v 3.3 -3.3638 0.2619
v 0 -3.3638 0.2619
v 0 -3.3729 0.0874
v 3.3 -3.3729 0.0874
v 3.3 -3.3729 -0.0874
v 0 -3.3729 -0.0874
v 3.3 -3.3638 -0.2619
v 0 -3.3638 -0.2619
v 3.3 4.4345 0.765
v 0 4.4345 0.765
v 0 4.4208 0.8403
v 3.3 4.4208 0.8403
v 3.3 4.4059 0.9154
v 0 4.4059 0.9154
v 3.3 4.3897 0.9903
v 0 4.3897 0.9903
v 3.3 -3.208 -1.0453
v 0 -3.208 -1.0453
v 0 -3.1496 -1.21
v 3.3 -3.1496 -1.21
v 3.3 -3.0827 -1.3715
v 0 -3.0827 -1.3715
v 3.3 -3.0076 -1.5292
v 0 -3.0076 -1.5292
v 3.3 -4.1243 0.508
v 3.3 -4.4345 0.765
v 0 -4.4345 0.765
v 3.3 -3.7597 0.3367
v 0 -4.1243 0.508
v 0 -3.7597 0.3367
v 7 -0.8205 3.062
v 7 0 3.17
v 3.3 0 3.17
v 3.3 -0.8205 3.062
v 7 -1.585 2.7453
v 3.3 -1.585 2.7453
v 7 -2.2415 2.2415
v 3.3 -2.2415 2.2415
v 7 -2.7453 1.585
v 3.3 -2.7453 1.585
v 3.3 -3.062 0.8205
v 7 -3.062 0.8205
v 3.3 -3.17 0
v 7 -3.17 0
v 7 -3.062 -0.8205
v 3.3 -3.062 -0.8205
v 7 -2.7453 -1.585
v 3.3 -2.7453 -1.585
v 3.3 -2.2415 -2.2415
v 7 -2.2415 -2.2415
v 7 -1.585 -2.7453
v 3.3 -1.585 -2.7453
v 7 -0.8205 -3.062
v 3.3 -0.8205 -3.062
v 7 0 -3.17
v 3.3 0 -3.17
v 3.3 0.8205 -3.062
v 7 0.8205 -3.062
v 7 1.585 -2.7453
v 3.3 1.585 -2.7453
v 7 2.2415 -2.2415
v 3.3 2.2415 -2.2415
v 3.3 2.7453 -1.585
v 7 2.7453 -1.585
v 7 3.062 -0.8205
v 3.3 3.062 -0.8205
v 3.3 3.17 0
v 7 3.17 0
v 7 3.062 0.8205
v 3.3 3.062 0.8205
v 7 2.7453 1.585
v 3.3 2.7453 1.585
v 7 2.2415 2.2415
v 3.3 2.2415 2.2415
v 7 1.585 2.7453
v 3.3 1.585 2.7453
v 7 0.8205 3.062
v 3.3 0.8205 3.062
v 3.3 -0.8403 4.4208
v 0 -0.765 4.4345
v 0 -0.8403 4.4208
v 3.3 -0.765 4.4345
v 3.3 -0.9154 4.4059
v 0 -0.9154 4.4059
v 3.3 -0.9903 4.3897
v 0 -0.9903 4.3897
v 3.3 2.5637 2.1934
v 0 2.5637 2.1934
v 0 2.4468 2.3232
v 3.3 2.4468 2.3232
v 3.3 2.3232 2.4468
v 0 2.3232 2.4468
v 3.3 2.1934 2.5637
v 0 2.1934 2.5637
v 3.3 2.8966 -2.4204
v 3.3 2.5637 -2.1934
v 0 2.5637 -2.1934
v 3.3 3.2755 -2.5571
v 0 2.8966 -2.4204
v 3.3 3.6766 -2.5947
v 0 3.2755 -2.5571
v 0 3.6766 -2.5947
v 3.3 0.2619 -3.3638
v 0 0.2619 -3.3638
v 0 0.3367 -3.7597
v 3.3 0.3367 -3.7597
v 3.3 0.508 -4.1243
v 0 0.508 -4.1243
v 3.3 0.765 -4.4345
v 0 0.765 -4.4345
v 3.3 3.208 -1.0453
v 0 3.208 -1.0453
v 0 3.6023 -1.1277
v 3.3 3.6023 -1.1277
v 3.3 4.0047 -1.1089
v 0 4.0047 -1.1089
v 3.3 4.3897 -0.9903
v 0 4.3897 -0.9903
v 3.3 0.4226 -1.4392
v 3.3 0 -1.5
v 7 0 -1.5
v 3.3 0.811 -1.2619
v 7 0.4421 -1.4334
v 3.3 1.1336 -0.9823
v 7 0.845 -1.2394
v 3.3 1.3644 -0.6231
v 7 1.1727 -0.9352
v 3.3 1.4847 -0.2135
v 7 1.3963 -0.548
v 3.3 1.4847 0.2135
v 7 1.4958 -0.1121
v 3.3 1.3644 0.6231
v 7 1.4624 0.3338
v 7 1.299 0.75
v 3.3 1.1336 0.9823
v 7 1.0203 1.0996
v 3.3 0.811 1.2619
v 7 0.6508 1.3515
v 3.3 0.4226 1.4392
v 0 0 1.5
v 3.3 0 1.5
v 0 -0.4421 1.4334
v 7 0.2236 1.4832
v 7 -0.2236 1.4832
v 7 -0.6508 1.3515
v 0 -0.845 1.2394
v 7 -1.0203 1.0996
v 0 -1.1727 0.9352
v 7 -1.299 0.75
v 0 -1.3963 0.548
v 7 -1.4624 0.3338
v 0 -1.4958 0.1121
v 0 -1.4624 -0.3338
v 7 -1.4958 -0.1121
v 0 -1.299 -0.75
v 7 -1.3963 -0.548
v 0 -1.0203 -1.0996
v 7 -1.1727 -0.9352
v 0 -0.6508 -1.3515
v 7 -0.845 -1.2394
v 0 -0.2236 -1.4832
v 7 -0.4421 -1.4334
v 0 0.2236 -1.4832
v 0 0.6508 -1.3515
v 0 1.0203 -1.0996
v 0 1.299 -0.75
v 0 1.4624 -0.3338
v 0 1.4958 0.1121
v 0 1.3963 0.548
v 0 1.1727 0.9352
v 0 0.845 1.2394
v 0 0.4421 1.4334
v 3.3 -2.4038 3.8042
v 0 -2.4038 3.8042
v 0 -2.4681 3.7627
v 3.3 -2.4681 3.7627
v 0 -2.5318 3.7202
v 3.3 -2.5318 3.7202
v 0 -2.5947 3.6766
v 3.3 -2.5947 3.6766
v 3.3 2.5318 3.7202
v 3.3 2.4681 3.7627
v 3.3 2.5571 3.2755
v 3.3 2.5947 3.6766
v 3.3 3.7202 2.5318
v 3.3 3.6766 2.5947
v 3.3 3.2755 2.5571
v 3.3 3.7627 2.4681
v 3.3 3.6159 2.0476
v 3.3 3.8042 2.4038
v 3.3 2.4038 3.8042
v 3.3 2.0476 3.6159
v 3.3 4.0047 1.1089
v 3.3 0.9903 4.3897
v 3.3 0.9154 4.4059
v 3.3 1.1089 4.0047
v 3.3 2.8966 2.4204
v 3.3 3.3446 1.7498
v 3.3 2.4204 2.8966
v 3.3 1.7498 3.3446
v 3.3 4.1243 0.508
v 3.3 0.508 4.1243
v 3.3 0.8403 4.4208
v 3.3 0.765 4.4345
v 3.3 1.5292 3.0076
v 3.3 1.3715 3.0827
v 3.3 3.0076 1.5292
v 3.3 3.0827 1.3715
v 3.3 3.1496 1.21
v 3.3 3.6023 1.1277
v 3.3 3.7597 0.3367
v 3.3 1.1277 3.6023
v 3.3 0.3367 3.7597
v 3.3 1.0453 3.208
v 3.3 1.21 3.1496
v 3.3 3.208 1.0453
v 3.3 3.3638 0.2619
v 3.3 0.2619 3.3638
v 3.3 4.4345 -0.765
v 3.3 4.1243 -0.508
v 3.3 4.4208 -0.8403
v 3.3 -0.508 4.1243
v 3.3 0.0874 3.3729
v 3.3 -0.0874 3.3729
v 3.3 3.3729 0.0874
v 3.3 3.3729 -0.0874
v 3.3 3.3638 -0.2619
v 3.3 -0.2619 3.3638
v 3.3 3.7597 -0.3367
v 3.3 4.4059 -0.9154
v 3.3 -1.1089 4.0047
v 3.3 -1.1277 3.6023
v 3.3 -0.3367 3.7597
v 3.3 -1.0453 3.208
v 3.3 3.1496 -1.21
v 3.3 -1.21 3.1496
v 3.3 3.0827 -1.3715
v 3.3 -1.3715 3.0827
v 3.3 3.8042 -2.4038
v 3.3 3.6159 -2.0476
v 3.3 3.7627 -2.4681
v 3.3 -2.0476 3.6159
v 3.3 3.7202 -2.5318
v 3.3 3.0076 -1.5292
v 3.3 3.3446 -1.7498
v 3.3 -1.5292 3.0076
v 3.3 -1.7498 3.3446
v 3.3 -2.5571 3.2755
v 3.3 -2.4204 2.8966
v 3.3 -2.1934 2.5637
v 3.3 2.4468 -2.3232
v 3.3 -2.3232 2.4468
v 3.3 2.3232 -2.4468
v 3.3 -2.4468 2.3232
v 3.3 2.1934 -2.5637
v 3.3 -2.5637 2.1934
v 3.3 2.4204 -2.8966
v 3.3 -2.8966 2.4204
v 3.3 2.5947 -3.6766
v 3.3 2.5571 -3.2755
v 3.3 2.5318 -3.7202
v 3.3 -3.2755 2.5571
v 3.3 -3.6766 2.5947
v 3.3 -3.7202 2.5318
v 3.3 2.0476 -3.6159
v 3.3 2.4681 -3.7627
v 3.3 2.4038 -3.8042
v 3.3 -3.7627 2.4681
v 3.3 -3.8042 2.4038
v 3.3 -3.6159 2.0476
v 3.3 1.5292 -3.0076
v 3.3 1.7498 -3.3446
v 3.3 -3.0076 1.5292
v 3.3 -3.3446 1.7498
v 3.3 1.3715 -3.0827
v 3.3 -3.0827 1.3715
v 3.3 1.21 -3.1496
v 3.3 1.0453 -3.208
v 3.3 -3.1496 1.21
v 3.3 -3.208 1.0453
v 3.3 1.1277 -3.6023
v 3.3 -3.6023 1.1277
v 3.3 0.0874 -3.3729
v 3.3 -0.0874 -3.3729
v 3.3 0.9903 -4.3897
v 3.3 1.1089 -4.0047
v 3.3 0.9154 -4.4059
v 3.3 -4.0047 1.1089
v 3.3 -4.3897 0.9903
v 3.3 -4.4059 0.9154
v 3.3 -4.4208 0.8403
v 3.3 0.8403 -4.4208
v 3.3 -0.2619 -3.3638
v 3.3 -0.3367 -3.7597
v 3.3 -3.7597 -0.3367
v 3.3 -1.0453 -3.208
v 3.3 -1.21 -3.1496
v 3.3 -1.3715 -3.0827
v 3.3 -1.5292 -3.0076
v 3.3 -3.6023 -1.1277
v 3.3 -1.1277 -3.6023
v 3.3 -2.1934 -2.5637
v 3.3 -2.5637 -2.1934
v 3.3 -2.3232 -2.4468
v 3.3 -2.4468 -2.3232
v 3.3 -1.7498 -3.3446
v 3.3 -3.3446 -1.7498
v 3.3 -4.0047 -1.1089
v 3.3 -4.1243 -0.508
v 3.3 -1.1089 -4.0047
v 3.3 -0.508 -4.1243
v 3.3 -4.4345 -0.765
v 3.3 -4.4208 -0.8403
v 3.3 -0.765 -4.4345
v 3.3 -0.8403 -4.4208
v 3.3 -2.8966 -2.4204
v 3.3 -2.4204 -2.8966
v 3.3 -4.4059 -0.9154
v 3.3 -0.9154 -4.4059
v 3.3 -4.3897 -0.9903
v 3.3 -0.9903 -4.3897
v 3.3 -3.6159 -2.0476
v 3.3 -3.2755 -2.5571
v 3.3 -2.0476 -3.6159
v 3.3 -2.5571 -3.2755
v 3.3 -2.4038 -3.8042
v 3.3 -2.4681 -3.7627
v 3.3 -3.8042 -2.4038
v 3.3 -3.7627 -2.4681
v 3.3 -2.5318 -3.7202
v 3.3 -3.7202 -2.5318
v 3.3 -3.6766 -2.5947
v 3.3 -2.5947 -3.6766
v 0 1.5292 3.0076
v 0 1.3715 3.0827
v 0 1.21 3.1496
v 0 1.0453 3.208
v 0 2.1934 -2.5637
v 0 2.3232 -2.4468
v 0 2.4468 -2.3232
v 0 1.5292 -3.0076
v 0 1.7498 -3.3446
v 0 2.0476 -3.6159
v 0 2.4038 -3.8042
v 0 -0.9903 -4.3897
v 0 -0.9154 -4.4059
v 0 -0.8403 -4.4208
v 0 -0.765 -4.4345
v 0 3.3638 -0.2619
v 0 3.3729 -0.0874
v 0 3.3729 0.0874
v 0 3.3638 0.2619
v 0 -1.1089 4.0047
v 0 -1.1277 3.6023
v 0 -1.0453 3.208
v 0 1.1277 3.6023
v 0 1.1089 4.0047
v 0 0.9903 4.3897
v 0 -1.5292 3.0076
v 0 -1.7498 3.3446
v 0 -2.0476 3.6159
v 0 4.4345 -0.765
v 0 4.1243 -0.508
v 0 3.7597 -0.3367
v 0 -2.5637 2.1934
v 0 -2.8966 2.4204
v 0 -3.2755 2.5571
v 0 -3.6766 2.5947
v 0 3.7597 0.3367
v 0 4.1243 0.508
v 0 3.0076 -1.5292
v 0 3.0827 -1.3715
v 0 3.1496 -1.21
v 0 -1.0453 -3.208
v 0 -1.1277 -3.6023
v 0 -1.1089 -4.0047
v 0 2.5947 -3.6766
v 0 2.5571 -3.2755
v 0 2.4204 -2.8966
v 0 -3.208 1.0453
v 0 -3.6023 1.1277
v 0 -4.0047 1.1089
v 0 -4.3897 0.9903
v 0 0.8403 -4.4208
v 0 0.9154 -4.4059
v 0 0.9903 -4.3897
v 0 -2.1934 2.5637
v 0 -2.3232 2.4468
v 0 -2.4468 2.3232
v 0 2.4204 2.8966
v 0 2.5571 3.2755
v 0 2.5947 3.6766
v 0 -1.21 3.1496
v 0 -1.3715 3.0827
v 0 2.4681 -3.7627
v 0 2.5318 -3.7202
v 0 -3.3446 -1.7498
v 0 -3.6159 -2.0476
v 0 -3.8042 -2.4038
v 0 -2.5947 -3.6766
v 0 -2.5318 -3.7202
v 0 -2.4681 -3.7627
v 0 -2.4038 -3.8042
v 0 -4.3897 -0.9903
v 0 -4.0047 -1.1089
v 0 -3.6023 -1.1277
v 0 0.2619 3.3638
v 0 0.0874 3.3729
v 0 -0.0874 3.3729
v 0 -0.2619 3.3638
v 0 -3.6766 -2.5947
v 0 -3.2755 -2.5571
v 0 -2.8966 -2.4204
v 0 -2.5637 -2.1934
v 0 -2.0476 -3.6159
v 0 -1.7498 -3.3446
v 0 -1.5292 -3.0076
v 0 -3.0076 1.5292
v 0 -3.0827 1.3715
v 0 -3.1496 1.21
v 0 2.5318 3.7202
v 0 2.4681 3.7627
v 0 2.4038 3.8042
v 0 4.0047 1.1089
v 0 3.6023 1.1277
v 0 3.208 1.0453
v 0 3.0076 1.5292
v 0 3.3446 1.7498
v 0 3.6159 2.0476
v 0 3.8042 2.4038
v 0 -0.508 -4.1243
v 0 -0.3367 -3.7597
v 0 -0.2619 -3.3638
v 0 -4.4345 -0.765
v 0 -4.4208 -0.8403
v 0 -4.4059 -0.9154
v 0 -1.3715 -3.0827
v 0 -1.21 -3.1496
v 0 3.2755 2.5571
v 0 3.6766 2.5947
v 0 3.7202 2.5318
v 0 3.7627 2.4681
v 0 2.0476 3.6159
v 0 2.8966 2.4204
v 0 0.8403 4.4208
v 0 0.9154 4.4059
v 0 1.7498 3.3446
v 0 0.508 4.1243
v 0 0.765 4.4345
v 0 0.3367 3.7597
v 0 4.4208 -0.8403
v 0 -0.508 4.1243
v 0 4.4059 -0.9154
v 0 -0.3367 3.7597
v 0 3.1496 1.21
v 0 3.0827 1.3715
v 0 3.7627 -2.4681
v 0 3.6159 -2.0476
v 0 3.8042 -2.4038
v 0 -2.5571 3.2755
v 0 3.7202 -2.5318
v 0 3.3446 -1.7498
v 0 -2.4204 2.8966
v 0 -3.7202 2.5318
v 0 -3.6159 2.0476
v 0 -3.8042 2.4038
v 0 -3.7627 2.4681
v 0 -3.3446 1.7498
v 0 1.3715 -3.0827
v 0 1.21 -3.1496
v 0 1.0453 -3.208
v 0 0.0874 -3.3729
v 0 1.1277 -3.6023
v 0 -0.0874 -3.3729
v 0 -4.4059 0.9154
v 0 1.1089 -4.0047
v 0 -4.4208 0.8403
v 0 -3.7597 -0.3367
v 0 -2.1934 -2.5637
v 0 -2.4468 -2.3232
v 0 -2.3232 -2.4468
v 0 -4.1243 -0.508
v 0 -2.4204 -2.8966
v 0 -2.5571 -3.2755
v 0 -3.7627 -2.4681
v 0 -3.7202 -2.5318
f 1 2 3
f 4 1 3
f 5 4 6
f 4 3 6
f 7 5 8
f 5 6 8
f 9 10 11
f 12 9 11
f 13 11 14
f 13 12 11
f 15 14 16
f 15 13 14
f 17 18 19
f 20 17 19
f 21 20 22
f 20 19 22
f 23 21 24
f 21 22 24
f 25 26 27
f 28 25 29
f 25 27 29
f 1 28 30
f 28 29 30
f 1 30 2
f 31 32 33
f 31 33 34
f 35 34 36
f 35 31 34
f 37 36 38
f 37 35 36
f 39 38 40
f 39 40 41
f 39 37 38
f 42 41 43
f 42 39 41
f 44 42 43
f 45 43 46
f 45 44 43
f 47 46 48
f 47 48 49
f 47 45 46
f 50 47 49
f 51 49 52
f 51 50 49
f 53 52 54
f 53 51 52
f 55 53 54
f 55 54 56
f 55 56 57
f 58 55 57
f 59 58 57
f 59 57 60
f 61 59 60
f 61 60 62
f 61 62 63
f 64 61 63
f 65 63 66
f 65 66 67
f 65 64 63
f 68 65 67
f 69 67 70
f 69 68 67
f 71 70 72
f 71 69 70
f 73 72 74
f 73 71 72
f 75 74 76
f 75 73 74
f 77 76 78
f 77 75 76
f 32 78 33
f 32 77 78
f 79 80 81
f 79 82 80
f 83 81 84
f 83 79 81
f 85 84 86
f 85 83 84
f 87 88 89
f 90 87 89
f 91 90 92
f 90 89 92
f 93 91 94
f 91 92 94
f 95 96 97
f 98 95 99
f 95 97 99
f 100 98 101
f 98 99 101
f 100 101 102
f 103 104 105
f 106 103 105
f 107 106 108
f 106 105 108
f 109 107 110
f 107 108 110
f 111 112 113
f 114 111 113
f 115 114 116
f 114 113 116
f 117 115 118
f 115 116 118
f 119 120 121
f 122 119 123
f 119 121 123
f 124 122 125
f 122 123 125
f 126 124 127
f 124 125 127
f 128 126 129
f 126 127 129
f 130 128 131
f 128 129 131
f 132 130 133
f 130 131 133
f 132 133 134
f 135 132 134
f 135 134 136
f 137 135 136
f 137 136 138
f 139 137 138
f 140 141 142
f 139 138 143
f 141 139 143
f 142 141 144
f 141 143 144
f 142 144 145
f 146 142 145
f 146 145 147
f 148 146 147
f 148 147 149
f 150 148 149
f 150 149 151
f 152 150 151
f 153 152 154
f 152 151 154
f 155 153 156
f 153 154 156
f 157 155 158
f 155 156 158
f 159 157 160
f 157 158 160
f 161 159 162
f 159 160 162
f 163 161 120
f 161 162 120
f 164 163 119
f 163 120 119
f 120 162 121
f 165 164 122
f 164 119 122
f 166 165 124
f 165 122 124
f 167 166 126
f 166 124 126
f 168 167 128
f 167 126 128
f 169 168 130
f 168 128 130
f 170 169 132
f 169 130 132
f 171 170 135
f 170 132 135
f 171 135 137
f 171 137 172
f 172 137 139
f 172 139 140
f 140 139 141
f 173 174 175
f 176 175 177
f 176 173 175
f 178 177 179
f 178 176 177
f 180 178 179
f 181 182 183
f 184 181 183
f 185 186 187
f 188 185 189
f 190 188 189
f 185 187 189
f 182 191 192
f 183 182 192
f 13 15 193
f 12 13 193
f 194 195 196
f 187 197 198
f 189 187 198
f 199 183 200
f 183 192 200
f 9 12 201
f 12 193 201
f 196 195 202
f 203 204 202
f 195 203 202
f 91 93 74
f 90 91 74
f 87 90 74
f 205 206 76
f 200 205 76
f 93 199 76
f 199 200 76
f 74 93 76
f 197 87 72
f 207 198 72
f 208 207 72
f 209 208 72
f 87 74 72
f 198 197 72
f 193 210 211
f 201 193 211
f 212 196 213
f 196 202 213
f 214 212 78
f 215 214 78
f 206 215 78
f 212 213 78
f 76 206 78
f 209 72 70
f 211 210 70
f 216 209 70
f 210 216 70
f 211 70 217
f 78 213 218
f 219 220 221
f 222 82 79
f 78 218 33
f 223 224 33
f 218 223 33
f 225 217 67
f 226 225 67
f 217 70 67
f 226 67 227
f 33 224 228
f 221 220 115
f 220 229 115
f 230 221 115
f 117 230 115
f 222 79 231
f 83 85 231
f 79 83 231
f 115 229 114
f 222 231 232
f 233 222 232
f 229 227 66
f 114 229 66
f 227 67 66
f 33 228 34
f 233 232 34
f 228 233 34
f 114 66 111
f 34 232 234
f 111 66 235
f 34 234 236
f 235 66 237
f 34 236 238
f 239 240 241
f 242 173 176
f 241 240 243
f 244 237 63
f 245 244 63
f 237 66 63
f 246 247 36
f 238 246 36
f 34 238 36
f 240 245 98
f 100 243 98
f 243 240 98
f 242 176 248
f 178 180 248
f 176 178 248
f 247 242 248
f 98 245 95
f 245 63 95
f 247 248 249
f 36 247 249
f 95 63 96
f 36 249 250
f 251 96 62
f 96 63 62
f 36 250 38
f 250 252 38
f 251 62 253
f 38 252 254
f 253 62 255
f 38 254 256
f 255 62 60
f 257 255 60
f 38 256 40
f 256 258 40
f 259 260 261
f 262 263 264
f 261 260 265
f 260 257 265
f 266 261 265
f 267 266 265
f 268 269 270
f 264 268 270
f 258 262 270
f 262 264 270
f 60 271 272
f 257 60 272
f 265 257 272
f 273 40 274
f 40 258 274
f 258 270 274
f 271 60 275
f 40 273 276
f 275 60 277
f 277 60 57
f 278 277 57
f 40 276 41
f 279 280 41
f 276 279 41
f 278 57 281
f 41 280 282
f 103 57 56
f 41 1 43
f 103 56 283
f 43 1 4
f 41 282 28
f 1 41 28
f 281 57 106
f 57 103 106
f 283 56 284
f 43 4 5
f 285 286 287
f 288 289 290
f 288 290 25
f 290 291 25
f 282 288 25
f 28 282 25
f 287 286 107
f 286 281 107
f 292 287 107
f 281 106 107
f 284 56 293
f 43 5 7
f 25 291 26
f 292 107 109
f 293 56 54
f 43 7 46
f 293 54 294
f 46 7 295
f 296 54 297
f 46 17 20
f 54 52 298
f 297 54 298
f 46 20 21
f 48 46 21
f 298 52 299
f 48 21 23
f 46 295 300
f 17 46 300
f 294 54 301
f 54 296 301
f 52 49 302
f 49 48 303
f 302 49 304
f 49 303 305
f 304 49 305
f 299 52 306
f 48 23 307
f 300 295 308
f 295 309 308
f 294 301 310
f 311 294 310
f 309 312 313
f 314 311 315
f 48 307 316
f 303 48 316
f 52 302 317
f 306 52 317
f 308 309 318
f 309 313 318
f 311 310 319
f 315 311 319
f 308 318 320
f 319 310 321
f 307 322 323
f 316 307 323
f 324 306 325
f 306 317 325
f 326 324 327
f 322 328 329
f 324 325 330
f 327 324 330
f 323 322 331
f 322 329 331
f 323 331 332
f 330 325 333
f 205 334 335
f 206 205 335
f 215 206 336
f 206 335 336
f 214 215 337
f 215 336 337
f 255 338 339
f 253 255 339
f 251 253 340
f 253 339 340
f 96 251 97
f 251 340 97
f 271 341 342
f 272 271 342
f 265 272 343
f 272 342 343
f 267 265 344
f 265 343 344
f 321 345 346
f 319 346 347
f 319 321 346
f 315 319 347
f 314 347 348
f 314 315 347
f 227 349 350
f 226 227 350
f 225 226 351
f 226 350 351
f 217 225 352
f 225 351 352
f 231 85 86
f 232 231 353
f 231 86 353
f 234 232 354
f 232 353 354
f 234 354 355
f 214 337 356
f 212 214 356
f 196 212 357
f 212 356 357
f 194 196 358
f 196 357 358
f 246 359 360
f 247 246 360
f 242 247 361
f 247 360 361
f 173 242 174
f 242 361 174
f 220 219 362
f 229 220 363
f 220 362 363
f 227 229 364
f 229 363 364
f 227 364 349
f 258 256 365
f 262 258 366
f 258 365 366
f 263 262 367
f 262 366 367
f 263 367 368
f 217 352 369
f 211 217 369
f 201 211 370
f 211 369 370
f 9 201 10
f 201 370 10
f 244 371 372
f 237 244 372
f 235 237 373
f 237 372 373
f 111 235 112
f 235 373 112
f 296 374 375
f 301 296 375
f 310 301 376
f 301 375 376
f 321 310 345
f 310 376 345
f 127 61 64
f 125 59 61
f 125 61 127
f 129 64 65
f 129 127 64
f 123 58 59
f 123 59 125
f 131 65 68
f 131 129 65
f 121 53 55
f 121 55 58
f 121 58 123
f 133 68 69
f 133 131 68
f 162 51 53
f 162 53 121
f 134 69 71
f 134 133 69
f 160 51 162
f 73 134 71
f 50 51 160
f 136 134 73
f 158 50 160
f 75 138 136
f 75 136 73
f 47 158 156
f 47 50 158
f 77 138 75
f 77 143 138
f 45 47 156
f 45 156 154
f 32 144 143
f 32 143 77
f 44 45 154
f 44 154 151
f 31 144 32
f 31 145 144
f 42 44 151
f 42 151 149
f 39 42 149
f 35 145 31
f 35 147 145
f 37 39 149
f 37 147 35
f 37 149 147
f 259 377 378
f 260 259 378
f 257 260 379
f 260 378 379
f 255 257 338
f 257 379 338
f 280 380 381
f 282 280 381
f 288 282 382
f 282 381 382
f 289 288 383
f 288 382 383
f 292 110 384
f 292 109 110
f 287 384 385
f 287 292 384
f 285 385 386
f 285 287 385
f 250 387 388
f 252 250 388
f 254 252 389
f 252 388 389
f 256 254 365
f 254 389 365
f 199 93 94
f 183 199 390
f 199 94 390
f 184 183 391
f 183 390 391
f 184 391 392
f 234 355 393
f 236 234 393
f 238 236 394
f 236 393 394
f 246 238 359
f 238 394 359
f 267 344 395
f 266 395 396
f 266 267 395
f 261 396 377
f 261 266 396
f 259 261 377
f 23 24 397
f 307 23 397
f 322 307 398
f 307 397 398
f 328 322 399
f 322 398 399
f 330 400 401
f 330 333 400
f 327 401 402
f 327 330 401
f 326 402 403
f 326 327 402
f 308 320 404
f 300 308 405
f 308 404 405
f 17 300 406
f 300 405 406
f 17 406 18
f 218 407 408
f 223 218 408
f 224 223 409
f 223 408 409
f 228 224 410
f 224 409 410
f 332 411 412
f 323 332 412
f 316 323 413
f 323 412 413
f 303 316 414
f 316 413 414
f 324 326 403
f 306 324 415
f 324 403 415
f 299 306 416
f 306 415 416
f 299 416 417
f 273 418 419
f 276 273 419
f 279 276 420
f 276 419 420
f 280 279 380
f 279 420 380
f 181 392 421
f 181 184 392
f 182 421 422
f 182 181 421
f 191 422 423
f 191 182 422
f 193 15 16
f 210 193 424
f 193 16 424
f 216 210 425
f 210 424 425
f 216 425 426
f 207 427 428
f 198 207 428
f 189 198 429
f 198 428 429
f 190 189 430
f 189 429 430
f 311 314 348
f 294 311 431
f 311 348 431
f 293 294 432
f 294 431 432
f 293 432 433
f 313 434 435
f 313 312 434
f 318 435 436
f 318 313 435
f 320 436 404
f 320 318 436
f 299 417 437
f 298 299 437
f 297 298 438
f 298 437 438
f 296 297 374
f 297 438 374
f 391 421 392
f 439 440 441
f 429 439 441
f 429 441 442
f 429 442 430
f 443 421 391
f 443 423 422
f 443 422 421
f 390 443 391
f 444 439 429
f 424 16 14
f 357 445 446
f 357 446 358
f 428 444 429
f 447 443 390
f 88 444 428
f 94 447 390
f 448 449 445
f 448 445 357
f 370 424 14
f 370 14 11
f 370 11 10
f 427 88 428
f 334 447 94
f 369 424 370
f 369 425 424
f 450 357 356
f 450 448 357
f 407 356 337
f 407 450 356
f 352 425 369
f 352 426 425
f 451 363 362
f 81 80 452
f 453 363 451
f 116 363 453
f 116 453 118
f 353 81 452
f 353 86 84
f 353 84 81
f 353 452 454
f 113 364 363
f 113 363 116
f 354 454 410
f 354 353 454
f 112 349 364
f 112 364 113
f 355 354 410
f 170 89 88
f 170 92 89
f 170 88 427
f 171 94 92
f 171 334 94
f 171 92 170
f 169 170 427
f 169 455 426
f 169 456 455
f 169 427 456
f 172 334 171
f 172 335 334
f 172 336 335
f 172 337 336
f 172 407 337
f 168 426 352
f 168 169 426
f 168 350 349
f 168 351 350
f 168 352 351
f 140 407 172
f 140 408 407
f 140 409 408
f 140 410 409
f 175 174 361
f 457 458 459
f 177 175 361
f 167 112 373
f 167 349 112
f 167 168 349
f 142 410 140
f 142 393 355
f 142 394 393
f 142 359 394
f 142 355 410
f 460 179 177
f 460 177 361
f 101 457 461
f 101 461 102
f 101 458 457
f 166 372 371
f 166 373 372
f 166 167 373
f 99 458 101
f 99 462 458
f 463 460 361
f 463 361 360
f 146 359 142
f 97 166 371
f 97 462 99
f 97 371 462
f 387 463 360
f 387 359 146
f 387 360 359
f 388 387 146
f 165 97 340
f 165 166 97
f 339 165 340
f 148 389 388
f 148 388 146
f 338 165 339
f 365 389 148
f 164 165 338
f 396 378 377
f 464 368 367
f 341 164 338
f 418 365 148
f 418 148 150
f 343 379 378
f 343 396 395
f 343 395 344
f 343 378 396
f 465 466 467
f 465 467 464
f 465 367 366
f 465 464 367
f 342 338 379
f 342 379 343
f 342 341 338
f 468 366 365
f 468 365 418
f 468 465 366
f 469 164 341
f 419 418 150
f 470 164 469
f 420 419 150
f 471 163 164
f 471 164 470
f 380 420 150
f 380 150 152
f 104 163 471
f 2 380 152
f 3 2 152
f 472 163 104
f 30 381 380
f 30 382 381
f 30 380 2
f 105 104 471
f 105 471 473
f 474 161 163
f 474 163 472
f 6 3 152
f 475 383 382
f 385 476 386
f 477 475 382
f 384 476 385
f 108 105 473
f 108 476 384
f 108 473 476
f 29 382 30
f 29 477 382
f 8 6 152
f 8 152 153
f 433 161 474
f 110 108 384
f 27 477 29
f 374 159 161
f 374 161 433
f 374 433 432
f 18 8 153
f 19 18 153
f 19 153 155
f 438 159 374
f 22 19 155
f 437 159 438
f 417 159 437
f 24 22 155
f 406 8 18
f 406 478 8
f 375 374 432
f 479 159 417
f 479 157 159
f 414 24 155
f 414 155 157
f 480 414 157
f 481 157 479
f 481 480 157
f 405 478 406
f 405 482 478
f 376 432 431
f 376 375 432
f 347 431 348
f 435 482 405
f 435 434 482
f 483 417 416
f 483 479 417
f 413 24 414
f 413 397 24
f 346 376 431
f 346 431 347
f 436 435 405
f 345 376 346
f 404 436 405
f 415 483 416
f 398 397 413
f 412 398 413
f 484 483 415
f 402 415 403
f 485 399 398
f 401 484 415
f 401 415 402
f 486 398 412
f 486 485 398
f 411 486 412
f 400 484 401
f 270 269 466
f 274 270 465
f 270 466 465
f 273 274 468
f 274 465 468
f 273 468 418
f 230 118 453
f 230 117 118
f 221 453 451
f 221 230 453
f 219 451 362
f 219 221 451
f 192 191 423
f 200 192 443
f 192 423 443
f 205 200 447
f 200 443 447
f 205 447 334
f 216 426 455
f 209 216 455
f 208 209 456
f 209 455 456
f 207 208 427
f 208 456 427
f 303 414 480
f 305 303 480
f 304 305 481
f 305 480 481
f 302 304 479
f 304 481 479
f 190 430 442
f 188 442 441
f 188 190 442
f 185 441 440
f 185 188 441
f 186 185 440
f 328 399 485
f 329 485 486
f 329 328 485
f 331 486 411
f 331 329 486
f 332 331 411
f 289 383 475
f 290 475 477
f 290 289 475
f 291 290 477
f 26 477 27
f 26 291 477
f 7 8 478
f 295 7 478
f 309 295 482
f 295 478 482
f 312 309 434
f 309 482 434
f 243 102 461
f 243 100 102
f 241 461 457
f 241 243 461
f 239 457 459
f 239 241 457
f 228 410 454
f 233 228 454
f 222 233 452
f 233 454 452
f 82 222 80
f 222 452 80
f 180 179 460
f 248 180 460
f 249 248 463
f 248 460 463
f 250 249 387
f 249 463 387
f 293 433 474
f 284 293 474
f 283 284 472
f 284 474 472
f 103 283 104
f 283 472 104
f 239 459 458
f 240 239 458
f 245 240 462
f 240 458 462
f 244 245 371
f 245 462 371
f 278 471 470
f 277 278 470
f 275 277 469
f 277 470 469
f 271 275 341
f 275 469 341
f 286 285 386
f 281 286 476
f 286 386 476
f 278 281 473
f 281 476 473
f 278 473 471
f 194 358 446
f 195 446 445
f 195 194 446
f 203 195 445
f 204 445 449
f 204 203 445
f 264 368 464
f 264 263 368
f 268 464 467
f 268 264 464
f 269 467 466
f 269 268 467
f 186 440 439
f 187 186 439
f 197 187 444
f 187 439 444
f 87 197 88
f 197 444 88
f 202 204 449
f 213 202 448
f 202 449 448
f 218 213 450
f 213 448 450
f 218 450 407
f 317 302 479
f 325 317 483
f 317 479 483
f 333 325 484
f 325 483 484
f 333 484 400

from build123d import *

# Parameters (mm, degrees)
BASPROSKE_W        = 3.3
BASPROSKE_H        = 4.5
TOOTHCUT_DEPTH     = 8.168681887
TEETHCUTS_COUNT    = 16
TEETHCUTS_ANGLE    = 337.5
BORSKE_R           = 1.5
BORE_DEPTH         = 50.0000508
BOSS_EXTRU_1_START = 3.7
ESQUISSE1_R        = 3.17
ESQUISSE1_R_2      = 1.5
BOSS_EXTRU_1_DEPTH = 3.7


with BuildPart() as part:
    # BasProSke → Base-Revolve (revolve)
    with BuildSketch(Plane(origin=(0, 0, 0), x_dir=(1, 0, 0), z_dir=(0, 1, 0)), mode=Mode.PRIVATE) as base_revolve_sk:
        with Locations((1.65, 2.25)):
            Rectangle(BASPROSKE_W, BASPROSKE_H)
    revolve(base_revolve_sk.sketch.rotate(Axis((-10, 0, 0), (1, 0, 0)), 180), axis=Axis((-10, 0, 0), (1, 0, 0)))

    # TooCutSke → ToothCut (cut, through all)
    with BuildSketch(Plane(origin=(0, 0, 0), x_dir=(0, 0, -1), z_dir=(1, 0, 0))):
        with BuildLine():
            ThreePointArc((0.261866103, 3.363822549), (0, 3.374), (-0.261866103, 3.363822549))
            ThreePointArc((-0.261866103, 3.363822549), (-0.417714668, 3.961827375), (-0.788562282, 4.456165918))
            ThreePointArc((-0.788562282, 4.456165918), (0, 4.5254), (0.788562282, 4.456165918))
            ThreePointArc((0.788562282, 4.456165918), (0.417714668, 3.961827375), (0.261866103, 3.363822549))
        make_face()
    toothcut = extrude(amount=TOOTHCUT_DEPTH, mode=Mode.SUBTRACT)

    # TeethCuts: ToothCut ×16 about axis
    teethcuts_axis = Axis((-10, 0, 0), (1, 0, 0))
    for i in range(1, TEETHCUTS_COUNT):
        add(toothcut.rotate(teethcuts_axis, i * TEETHCUTS_ANGLE / (TEETHCUTS_COUNT - 1)), mode=Mode.SUBTRACT)

    # BorSke → Bore (cut, symmetric)
    with BuildSketch(Plane(origin=(0, 0, 0), x_dir=(0, 0, -1), z_dir=(1, 0, 0))):
        with Locations(Location((0, 0, 0), (0, 0, 180))):
            Circle(BORSKE_R)
    extrude(amount=BORE_DEPTH, both=True, mode=Mode.SUBTRACT)

    # Esquisse1 → Boss.-Extru.1 (add)
    with BuildSketch(Plane(origin=(3.3, 0, 0), x_dir=(0, 0, -1), z_dir=(1, 0, 0)).offset(BOSS_EXTRU_1_START)):
        with Locations(Location((0, 0, 0), (0, 0, 180))):
            Circle(ESQUISSE1_R)
        Circle(ESQUISSE1_R_2, mode=Mode.SUBTRACT)
    extrude(amount=-BOSS_EXTRU_1_DEPTH)


solid = part.part
